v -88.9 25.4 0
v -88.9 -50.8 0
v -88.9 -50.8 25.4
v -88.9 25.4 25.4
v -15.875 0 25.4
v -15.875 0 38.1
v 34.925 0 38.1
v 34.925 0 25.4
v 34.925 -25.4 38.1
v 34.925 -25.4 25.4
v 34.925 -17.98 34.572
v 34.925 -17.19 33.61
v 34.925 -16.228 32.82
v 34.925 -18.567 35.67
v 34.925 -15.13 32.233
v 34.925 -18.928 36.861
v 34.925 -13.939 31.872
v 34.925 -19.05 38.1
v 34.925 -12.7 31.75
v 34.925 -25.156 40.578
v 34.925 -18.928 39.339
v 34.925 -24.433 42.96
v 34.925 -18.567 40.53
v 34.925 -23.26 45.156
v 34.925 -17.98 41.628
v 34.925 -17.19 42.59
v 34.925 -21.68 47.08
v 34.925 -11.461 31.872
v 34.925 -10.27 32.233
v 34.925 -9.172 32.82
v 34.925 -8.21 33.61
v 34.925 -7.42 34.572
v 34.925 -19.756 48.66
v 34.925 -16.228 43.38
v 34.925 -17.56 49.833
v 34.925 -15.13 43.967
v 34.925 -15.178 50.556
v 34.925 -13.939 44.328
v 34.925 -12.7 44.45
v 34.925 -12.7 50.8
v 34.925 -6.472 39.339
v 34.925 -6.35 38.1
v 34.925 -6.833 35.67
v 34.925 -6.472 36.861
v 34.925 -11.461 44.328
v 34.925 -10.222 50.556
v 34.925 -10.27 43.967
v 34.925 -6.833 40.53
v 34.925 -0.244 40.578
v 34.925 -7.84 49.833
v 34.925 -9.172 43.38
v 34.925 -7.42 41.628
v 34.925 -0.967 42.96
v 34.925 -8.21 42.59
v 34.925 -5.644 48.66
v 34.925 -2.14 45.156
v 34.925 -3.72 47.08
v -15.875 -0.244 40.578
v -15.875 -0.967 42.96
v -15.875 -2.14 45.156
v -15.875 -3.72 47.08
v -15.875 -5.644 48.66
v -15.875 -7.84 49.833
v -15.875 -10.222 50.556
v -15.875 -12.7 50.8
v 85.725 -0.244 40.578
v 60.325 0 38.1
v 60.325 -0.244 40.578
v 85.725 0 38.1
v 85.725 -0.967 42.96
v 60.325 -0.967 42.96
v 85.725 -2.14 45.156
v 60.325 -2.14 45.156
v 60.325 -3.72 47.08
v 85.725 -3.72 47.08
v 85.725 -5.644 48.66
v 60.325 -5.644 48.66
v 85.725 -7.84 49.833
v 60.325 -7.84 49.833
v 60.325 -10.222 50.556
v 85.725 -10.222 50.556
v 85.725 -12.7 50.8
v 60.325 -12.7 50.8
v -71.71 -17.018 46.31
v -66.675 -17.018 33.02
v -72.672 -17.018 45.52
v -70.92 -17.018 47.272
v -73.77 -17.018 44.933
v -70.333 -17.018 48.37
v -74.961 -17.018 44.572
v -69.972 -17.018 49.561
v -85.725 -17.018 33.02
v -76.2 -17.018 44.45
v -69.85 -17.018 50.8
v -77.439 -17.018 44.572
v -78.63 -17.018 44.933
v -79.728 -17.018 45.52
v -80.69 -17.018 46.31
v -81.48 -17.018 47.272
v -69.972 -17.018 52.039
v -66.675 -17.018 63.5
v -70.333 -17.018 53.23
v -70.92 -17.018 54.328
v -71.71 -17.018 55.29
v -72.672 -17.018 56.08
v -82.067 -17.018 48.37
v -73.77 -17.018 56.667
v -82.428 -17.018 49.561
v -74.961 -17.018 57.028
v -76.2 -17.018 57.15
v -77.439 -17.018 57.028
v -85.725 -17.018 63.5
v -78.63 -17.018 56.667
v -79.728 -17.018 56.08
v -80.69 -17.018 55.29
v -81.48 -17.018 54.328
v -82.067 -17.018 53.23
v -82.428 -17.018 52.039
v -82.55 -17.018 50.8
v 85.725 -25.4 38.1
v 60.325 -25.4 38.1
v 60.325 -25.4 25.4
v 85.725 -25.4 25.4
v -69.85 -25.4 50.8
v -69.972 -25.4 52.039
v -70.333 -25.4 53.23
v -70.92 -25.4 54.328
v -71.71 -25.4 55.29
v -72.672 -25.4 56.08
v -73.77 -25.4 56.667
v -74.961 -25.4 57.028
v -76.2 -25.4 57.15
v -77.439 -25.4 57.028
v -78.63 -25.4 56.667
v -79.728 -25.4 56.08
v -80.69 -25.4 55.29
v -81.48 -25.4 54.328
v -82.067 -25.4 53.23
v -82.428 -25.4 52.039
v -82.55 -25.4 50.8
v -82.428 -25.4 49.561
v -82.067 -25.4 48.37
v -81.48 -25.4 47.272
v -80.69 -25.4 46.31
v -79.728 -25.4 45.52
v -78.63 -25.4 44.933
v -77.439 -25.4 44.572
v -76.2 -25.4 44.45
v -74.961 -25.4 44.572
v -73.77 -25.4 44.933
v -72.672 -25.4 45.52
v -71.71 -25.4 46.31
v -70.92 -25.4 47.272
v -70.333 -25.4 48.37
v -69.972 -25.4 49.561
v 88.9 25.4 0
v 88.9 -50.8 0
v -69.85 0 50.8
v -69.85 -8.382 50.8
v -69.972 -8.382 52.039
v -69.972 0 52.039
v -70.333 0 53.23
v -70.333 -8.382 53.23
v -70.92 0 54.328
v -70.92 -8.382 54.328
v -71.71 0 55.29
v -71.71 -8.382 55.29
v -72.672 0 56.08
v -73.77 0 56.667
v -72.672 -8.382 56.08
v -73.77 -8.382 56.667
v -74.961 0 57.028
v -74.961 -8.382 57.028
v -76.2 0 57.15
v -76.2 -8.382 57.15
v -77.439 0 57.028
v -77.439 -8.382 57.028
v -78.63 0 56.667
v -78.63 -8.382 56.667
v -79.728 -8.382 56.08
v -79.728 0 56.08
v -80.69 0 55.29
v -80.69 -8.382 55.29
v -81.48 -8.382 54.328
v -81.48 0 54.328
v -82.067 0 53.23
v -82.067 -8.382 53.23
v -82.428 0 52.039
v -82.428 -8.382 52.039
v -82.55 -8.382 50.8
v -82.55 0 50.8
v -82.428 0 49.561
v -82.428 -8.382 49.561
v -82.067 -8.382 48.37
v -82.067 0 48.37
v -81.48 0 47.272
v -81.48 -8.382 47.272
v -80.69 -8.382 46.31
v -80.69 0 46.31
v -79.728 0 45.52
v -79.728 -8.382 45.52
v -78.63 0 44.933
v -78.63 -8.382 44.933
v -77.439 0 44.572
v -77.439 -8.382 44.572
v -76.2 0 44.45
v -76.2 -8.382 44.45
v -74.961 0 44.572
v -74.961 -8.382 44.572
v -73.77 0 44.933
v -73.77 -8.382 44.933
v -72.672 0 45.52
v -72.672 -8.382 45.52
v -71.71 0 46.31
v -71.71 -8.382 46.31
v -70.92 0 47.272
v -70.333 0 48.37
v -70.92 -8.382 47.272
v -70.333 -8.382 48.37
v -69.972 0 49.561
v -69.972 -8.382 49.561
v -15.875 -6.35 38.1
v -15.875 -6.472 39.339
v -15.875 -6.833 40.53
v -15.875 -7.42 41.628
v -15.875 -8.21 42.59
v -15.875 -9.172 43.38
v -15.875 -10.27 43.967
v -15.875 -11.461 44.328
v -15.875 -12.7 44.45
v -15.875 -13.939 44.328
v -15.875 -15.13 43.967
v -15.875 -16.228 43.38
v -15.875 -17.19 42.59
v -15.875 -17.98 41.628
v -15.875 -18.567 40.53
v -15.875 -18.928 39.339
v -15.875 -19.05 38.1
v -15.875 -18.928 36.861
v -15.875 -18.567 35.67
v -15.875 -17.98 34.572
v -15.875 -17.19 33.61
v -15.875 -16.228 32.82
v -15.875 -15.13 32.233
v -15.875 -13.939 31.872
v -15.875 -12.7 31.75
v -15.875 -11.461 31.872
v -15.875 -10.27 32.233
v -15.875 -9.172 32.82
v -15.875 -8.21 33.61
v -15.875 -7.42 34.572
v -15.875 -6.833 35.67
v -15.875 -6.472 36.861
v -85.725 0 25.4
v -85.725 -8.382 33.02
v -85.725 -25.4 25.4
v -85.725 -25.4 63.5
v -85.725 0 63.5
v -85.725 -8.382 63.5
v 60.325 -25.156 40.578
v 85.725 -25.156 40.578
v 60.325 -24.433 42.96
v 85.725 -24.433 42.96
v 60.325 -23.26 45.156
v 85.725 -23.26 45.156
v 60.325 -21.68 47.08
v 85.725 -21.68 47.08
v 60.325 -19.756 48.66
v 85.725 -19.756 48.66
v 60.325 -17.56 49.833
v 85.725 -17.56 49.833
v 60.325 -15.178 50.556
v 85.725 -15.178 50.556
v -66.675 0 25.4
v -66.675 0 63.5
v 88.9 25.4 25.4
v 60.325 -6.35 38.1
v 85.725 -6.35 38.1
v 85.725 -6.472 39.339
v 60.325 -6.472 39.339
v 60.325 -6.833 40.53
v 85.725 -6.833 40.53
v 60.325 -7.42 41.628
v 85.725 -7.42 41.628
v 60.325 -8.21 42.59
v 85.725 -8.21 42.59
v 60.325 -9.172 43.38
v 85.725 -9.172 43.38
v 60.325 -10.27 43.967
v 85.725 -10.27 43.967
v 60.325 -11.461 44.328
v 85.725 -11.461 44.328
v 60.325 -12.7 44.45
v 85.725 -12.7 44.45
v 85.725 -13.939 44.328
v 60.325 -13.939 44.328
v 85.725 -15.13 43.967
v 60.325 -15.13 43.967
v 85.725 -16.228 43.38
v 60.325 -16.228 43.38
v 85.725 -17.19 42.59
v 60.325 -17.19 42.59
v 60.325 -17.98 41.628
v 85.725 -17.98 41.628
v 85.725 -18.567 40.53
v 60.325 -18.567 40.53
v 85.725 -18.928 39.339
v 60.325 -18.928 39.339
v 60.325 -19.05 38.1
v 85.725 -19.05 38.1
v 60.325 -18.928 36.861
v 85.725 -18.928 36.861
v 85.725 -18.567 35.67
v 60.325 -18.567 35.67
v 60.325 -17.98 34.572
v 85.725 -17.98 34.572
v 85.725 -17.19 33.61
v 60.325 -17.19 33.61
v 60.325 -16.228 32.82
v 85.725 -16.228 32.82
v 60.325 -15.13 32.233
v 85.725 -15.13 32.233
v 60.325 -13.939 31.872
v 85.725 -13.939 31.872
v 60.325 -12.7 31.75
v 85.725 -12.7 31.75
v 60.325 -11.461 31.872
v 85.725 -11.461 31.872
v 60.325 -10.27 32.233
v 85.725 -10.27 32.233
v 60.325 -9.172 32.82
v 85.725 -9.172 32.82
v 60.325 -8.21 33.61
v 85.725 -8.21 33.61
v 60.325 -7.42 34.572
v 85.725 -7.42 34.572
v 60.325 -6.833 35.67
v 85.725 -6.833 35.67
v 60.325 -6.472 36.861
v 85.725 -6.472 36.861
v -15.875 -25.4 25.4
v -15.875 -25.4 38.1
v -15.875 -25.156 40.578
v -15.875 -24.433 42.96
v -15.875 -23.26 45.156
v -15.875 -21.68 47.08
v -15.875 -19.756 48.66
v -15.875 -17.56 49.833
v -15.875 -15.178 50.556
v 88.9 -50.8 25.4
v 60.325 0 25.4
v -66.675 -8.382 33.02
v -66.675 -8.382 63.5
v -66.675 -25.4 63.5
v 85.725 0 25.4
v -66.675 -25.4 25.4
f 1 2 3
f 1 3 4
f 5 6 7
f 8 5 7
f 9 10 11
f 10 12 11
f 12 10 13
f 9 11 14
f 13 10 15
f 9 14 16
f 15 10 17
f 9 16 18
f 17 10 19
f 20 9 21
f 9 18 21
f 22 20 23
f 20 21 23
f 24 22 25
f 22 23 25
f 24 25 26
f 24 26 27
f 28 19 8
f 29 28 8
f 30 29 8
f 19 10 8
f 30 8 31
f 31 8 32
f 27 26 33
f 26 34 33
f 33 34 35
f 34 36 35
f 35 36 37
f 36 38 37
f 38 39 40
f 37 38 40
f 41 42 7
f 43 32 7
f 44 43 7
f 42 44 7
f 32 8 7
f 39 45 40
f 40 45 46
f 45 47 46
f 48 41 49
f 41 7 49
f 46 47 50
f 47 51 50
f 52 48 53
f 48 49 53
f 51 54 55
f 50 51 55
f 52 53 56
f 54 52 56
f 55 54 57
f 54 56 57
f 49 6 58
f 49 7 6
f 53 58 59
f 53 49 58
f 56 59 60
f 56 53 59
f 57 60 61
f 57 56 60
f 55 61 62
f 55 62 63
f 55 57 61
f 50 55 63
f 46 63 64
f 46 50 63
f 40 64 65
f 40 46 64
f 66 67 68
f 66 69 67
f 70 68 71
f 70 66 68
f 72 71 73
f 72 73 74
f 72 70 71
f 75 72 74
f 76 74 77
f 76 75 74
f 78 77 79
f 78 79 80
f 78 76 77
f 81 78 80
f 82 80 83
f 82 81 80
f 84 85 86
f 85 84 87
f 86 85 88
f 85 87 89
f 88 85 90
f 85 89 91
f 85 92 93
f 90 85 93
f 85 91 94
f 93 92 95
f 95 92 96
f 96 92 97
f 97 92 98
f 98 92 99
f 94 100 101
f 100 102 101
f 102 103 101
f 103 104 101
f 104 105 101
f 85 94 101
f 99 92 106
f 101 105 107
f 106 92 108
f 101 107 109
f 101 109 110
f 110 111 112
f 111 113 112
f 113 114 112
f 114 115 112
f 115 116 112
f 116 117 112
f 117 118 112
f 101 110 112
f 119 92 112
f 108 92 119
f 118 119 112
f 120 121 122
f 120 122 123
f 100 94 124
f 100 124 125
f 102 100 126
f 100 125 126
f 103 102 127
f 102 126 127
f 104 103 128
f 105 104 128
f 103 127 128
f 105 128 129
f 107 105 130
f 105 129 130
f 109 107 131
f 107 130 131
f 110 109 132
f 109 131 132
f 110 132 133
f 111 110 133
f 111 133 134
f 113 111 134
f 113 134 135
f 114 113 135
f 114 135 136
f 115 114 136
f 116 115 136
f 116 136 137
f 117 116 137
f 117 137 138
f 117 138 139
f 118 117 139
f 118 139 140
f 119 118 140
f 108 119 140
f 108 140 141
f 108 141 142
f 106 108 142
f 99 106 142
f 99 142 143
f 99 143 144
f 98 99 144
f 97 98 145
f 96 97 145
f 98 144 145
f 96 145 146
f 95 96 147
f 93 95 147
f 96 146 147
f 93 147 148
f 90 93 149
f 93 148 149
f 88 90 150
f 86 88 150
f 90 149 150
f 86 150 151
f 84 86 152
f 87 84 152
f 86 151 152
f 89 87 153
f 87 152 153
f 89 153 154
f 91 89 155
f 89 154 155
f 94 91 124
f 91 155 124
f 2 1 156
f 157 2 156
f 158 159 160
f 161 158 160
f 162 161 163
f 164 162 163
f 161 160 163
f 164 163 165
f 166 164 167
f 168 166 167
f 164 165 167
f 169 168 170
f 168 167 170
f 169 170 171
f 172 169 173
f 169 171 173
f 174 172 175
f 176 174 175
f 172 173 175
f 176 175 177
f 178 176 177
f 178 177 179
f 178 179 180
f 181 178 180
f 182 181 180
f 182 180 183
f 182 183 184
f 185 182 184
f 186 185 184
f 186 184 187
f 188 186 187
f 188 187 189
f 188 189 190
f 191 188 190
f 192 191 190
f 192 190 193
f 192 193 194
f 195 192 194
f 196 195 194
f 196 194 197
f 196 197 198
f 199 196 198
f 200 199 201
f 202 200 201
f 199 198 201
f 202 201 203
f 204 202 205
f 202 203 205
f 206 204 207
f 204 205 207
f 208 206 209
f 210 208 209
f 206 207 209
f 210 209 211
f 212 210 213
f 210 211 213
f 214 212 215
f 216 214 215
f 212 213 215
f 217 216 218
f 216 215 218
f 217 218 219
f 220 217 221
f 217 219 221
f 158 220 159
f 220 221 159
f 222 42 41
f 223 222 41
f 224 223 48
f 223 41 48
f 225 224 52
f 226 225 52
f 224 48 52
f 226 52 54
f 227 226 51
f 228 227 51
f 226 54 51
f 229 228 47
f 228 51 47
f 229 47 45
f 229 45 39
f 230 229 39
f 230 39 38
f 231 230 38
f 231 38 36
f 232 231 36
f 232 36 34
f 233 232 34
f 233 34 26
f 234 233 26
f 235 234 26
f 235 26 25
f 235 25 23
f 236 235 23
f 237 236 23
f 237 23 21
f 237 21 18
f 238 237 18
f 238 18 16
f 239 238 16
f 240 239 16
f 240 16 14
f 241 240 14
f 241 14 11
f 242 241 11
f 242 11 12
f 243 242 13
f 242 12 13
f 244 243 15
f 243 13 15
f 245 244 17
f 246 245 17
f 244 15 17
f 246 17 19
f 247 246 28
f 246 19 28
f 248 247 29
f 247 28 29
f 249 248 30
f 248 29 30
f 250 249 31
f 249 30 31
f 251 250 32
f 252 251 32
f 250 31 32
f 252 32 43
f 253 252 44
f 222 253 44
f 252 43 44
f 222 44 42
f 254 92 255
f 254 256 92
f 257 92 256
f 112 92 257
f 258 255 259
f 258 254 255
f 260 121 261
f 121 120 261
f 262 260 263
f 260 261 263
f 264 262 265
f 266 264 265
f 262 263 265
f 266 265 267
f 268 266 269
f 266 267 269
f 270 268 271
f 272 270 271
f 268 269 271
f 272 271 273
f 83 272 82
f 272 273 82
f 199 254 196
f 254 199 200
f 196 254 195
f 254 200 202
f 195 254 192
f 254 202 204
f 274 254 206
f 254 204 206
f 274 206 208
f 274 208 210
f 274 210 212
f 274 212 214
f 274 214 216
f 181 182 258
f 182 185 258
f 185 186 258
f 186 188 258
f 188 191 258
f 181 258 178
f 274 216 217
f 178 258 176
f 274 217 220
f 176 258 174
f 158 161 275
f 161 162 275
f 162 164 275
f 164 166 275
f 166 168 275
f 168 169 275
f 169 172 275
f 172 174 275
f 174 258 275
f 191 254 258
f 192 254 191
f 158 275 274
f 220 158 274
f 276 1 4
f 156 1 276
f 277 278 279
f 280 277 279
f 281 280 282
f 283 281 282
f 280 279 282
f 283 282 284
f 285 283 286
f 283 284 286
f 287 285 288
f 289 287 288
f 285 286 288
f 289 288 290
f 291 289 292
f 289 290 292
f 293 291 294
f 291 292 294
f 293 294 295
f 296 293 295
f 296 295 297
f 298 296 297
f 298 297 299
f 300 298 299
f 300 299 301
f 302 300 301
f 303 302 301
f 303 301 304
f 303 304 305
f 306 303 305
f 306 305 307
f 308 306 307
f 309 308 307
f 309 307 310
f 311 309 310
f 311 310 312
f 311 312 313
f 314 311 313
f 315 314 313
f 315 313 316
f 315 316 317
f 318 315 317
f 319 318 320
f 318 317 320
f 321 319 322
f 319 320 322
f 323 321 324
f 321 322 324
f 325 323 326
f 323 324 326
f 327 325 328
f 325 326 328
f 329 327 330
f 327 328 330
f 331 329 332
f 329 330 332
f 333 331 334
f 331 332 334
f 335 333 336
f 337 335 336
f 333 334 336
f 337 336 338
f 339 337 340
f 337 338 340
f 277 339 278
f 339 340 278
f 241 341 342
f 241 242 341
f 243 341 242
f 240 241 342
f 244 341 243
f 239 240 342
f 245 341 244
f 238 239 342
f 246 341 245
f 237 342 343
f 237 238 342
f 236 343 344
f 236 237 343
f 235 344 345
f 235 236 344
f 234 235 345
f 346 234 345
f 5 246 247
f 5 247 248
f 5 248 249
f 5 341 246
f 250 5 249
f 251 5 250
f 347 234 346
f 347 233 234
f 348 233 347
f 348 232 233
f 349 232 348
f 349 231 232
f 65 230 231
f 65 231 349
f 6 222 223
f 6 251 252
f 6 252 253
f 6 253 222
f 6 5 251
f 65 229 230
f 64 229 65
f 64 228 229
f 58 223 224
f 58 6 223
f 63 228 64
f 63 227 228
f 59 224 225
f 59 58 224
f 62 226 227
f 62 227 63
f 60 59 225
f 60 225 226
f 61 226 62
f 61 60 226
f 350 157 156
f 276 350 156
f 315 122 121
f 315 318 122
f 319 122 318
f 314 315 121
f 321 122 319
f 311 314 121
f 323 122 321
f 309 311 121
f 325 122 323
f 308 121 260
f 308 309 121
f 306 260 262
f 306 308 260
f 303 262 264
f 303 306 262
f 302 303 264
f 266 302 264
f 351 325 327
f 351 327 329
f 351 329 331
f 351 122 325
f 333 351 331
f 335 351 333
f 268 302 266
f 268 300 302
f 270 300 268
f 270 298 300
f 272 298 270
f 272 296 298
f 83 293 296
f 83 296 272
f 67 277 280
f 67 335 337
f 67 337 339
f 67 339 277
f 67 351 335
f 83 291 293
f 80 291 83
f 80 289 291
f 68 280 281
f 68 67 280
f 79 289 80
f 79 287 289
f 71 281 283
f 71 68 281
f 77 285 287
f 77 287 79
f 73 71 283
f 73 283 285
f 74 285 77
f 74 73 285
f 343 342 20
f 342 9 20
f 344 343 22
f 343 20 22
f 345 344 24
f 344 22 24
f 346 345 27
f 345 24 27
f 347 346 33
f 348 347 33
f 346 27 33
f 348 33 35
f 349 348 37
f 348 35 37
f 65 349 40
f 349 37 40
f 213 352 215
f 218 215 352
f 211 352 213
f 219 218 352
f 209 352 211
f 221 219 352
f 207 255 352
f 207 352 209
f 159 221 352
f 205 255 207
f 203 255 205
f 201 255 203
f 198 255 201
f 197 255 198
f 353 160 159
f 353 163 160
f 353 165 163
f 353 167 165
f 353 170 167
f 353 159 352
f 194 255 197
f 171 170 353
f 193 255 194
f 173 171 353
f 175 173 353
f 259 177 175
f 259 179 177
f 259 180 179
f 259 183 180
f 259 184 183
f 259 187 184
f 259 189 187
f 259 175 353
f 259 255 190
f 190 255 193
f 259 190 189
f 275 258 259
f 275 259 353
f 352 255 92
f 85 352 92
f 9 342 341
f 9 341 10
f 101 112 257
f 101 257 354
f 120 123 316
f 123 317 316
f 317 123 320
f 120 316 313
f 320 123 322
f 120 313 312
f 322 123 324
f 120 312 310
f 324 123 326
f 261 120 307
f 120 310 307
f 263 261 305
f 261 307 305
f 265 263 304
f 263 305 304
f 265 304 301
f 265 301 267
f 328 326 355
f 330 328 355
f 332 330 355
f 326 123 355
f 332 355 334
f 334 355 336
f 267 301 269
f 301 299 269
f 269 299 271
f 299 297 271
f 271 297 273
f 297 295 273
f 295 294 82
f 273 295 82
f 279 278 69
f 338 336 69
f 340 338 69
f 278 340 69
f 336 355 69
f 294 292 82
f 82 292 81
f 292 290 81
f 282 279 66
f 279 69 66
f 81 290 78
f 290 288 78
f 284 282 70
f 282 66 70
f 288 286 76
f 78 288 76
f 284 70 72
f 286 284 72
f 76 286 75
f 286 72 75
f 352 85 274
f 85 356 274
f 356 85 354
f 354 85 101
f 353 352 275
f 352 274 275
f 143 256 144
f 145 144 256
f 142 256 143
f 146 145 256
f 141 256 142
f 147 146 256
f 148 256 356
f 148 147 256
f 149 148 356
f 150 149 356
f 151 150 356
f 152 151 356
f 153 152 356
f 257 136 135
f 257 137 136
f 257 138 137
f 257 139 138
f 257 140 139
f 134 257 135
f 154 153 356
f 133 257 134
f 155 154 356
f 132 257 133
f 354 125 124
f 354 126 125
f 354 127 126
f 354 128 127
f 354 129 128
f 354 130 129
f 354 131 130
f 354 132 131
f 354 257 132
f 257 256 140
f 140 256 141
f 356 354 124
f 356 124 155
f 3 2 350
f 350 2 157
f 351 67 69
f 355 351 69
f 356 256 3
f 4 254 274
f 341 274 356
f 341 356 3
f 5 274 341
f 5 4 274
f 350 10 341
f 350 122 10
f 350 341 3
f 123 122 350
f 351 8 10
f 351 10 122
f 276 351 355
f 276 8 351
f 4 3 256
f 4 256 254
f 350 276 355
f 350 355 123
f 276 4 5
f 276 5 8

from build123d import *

# Parameters (mm, degrees)
F0_W      = 177.8
F0_H      = 76.2
F1_DEPTH  = 25.4
F2_W      = 19.05
F2_H      = 38.1
F2_W_2    = 50.8
F2_H_2    = 25.4
F2_W_3    = 25.4
F3_DEPTH  = 25.4
F4_R      = 6.35
F5_DEPTH  = 101.6
F6_R      = 12.69999
F7_W      = 8.636
F7_H      = 30.48
F8_DEPTH  = 25.4
F9_R      = 6.35
F10_DEPTH = 25.4


# Not quite as in the source:
# - a fillet or chamfer is up to 0.001 mm smaller than in the source, because OpenCascade refuses the exact size


with BuildPart() as f1:
    # F0 (on Top) → F1 (new body)
    with BuildSketch(Plane.XY):
        with Locations((0, -12.7)):
            Rectangle(F0_W, F0_H)
    extrude(amount=F1_DEPTH)

    # F2 (on Front) → F3 (join)
    with BuildSketch(Plane.XZ):
        with Locations((-76.2, 44.45)):
            Rectangle(F2_W, F2_H)
        with Locations((9.525, 38.1)):
            Rectangle(F2_W_2, F2_H_2)
        with Locations((73.025, 38.1)):
            Rectangle(F2_W_3, F2_H_2)
    extrude(amount=F3_DEPTH)

    # F4 (on face) → F5 (cut, through all)
    with BuildSketch(Plane.YZ.offset(85.725)):
        with Locations((-12.7, 38.1)):
            Circle(F4_R)
    extrude(amount=-F5_DEPTH, mode=Mode.SUBTRACT)

    # F6 (radius 12.7 in the source; OpenCascade refuses exactly that, so slightly less here)
    f6_edges = [f1.edges().sort_by_distance(p)[0] for p in [
        (9.525, -25.4, 50.8),
        (9.525, 0, 50.8),
        (73.025, -25.4, 50.8),
        (73.025, 0, 50.8),
    ]]
    fillet(f6_edges, radius=F6_R)

    # F7 (on face) → F8 (cut)
    with BuildSketch(Plane(origin=(-85.725, 0, 0), x_dir=(0, -1, 0), z_dir=(-1, 0, 0))):
        with Locations((12.7, 48.26)):
            Rectangle(F7_W, F7_H)
    extrude(amount=-F8_DEPTH, mode=Mode.SUBTRACT)

    # F9 (on face) → F10 (cut)
    with BuildSketch(Plane.XZ.offset(25.4)):
        with Locations((-76.2, 50.8)):
            Circle(F9_R)
    extrude(amount=-F10_DEPTH, mode=Mode.SUBTRACT)


solid = f1.part
